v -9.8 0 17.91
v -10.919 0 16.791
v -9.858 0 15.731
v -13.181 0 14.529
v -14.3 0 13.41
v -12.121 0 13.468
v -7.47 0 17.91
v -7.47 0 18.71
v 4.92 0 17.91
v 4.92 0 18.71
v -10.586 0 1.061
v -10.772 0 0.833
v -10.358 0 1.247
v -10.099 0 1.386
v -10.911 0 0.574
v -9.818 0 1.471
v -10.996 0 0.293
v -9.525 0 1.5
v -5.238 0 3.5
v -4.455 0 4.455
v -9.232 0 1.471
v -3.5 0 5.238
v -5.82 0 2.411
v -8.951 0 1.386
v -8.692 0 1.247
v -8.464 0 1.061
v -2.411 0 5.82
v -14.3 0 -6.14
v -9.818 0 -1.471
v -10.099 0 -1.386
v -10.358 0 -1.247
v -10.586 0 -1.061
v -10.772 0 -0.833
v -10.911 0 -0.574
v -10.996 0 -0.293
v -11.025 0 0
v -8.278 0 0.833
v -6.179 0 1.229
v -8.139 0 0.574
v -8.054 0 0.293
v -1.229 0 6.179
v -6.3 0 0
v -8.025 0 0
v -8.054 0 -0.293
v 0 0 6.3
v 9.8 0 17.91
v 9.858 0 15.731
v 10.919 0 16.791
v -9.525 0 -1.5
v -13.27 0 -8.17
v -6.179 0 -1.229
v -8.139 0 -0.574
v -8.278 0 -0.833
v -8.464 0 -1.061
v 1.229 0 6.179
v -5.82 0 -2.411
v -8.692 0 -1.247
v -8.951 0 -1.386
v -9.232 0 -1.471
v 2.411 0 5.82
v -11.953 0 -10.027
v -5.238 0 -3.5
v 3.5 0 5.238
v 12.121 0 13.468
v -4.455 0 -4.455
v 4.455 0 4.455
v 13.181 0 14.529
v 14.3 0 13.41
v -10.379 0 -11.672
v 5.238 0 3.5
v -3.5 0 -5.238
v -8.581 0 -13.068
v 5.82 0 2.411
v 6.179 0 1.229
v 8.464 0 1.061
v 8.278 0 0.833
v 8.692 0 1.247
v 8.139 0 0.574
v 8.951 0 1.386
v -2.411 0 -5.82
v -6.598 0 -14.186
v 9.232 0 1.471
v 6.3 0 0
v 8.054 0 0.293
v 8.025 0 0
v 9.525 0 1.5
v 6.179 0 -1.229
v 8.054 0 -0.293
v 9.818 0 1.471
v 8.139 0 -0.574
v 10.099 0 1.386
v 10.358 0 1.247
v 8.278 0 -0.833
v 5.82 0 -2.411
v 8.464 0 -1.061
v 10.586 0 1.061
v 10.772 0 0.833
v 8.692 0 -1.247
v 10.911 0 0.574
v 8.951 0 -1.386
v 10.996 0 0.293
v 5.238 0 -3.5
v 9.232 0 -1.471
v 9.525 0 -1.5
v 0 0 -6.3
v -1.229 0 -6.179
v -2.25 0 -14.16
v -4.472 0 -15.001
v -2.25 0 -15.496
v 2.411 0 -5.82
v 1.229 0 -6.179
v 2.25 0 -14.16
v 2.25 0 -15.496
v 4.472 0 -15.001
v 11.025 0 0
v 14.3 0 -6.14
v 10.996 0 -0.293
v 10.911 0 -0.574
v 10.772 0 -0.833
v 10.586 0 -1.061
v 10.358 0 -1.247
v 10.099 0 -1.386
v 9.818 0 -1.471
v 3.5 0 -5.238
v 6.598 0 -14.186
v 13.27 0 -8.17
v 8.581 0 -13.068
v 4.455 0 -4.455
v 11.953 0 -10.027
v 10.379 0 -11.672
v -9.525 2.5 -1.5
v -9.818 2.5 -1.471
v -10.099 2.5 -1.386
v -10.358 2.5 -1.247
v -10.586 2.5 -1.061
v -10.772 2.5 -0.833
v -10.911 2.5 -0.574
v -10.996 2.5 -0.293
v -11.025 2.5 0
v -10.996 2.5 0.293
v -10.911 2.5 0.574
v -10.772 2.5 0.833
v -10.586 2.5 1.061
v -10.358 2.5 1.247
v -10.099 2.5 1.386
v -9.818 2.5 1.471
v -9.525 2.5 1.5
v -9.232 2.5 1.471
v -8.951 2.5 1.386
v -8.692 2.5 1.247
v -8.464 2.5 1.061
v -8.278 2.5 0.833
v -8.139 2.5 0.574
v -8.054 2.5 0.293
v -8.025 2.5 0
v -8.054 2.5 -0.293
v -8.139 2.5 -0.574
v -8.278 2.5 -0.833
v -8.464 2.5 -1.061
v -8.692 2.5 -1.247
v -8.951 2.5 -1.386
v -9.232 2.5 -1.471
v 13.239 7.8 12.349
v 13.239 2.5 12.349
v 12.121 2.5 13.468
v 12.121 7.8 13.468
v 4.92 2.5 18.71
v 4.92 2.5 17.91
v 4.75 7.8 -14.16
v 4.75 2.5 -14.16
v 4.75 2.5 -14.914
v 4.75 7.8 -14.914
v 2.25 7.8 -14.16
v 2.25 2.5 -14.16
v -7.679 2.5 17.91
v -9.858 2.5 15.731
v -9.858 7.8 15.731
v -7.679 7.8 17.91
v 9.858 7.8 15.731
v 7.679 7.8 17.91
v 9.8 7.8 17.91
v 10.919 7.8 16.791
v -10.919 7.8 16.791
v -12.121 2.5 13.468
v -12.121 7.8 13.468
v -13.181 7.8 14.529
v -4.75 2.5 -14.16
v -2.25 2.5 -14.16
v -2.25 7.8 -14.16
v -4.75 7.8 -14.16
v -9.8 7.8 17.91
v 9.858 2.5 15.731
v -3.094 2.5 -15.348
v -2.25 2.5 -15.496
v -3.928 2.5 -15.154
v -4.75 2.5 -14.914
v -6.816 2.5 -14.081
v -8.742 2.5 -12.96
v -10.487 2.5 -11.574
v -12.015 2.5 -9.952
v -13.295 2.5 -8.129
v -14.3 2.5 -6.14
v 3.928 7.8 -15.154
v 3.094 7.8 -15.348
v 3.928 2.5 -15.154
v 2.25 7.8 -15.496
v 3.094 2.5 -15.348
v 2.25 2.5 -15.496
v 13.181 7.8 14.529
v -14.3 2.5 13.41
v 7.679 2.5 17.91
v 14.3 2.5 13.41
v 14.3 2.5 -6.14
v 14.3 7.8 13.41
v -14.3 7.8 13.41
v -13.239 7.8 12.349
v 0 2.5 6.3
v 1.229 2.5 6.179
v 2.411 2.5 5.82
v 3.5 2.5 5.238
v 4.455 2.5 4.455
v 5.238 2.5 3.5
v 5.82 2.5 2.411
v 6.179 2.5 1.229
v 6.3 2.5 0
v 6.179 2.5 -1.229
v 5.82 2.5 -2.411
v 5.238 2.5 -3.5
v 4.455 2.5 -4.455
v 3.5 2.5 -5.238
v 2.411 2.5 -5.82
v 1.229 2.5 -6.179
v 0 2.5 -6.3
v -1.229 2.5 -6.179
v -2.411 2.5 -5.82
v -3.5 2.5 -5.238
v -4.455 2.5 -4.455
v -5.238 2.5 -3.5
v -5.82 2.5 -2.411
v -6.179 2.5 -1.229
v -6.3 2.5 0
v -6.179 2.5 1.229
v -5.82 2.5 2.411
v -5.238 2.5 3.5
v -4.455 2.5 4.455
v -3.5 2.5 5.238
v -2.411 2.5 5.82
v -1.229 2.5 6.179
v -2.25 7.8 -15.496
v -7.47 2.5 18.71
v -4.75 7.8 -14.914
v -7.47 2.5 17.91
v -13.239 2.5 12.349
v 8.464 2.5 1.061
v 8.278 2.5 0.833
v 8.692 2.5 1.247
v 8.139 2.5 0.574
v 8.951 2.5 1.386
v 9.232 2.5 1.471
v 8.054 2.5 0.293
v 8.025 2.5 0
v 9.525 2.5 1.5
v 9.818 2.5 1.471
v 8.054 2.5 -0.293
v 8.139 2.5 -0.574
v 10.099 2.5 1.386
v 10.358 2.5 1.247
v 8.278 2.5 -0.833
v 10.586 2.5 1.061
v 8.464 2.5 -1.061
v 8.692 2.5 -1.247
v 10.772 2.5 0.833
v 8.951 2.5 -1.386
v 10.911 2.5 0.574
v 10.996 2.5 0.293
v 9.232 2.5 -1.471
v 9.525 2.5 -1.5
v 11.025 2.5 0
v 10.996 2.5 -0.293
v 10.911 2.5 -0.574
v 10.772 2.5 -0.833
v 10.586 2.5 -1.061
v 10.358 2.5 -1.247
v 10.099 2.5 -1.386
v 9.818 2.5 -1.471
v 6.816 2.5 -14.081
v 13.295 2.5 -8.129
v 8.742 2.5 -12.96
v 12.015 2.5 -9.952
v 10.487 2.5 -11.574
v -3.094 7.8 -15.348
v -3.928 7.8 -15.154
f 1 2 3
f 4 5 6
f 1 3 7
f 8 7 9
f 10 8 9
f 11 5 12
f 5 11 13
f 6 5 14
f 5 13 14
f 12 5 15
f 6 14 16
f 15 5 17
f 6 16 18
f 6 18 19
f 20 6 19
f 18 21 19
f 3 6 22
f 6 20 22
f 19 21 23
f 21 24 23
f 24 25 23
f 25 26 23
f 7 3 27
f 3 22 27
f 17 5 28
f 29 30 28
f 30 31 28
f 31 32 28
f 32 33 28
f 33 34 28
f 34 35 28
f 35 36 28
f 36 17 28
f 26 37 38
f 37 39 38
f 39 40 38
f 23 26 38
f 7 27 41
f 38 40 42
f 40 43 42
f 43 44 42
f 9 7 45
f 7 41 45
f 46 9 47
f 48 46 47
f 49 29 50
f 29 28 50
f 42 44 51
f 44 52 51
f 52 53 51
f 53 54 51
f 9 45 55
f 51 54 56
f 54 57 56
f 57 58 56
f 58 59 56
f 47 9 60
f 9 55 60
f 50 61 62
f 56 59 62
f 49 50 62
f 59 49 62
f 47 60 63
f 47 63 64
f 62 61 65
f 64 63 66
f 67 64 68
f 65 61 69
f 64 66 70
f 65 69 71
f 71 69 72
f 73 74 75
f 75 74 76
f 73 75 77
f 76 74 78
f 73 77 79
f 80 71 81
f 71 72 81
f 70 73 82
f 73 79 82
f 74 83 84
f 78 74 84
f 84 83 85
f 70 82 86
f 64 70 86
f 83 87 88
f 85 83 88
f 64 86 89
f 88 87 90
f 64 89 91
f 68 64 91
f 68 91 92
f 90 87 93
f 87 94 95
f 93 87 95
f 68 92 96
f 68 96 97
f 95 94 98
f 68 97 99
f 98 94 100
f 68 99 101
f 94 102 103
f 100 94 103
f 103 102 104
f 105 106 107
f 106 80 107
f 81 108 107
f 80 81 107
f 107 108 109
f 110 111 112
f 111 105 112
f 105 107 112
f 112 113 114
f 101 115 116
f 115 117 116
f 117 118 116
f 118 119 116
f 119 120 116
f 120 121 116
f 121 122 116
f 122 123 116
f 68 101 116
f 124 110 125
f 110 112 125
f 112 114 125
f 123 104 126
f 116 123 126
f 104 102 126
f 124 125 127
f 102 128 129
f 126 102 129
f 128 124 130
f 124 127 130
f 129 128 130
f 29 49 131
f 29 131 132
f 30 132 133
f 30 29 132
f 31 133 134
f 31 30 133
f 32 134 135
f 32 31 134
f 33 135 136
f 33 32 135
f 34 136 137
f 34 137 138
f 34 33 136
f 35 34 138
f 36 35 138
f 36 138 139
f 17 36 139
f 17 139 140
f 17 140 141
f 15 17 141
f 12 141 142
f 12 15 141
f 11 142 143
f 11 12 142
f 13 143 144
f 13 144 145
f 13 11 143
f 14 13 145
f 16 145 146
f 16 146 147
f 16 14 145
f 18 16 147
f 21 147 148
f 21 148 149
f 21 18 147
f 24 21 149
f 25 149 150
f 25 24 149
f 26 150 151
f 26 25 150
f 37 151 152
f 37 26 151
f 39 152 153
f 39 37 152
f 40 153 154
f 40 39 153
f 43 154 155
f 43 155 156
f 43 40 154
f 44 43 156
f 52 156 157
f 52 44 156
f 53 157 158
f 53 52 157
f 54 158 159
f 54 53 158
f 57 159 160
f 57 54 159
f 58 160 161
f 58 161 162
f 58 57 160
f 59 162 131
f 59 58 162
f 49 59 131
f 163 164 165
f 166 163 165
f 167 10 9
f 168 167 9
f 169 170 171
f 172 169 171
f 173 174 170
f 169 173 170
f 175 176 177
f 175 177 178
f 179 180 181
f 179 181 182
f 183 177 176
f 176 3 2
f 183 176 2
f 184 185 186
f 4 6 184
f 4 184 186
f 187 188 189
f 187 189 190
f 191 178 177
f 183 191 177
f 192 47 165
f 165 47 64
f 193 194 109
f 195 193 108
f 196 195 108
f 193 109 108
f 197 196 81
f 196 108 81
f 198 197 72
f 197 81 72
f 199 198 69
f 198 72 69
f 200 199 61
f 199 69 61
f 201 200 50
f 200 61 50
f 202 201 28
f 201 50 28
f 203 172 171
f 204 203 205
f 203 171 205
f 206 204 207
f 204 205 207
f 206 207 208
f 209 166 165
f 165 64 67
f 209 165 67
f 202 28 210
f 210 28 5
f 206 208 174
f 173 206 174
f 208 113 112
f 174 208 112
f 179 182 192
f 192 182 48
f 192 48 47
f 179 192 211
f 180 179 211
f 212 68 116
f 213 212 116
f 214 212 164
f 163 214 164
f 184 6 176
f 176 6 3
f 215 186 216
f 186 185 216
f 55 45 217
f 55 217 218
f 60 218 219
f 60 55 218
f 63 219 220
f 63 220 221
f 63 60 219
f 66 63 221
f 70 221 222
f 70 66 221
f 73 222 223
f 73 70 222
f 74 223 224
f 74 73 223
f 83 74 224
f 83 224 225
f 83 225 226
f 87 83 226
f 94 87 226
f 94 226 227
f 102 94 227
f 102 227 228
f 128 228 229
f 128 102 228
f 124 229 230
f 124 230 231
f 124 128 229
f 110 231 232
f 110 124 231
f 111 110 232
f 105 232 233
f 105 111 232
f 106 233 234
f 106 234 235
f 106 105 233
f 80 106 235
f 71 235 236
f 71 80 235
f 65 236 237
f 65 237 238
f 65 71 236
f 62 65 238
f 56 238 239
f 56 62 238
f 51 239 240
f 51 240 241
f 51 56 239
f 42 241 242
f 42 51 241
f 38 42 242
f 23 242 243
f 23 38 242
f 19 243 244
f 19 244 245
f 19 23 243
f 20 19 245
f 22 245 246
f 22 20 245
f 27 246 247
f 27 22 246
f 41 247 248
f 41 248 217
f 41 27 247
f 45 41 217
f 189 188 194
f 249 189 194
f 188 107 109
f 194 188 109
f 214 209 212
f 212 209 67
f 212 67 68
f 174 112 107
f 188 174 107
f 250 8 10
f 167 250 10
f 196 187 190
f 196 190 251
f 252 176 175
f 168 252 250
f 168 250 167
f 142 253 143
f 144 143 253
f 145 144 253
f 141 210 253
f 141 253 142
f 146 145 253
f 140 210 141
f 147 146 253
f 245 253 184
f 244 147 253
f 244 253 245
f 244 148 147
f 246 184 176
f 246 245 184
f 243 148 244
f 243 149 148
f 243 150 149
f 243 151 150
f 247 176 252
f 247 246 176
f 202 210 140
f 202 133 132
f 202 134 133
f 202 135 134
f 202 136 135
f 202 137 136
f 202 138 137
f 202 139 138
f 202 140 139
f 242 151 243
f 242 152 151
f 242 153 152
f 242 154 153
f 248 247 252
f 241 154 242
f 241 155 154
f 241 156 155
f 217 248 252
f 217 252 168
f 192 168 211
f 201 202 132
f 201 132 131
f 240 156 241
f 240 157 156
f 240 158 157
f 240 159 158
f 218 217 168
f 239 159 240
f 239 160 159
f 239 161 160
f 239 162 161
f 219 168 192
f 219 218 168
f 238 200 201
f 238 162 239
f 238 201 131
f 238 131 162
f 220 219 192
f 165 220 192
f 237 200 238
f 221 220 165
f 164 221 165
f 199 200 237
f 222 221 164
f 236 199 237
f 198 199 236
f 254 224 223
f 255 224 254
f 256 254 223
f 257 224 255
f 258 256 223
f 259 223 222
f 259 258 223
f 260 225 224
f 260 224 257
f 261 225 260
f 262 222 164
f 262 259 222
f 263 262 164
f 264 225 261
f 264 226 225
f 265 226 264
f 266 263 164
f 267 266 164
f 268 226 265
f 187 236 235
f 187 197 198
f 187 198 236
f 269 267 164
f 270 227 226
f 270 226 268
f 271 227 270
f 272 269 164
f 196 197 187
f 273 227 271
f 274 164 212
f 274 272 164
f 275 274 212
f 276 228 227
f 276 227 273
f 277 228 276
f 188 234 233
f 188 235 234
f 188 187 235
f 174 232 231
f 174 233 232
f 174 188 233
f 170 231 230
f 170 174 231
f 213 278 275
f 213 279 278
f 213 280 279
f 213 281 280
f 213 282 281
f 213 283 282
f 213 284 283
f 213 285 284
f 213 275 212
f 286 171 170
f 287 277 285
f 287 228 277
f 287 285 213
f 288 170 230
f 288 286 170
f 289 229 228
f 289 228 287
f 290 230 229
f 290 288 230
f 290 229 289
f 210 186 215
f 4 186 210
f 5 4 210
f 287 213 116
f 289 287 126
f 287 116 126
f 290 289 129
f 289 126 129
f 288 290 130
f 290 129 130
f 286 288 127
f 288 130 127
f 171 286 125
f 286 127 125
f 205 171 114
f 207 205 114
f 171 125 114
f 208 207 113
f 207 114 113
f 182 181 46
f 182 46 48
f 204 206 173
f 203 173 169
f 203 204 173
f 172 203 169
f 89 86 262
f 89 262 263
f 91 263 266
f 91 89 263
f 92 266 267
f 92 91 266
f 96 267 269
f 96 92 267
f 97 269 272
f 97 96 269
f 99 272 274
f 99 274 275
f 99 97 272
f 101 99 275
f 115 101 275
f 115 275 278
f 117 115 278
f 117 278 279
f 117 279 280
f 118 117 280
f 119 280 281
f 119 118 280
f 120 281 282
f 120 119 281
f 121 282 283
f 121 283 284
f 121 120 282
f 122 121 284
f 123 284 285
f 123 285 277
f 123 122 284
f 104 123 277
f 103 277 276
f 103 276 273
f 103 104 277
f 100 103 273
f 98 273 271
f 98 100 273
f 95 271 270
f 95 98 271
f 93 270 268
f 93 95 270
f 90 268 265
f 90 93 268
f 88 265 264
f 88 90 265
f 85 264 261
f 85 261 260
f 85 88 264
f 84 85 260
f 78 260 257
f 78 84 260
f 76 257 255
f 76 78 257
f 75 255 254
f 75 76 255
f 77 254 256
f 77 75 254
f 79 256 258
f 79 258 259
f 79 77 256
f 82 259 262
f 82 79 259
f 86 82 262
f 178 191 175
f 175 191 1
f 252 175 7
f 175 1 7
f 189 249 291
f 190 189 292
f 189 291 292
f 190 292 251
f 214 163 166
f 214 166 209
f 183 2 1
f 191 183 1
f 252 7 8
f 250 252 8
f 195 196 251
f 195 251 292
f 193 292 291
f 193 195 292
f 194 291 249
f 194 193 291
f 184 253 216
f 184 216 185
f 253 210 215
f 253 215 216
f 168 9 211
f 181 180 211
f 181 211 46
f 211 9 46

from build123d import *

# Parameters (mm, degrees)
SKETCH1_R               = 1.5
SKETCH1_R_2             = 6.3
BOSS_EXTRUDE1_DEPTH     = 2.5
CUT_EXTRUDE1_DEPTH      = 24.681302751
CUT_EXTRUDE1_DEPTH_BACK = 24.681302751
BOSS_EXTRUDE2_DEPTH     = 5.3


with BuildPart() as part:
    # Sketch1 → Boss-Extrude1 (new body)
    with BuildSketch(Plane(origin=(0, 0, 0), x_dir=(1, 0, 0), z_dir=(0, 1, 0))):
        with BuildLine():
            Line((-14.3, 6.139966555), (-14.3, -13.41))
            Line((-14.3, -13.41), (-9.8, -17.91))
            Line((-9.8, -17.91), (-7.47, -17.91))
            Line((-7.47, -17.91), (-7.47, -18.71))
            Line((-7.47, -18.71), (4.92, -18.71))
            Line((4.92, -18.71), (4.92, -17.91))
            Line((4.92, -17.91), (9.8, -17.91))
            Line((9.8, -17.91), (14.3, -13.41))
            Line((14.3, -13.41), (14.3, 6.139966555))
            ThreePointArc((14.3, 6.139966555), (9.505716305, 12.4030126), (2.25, 15.495824073))
            Line((2.25, 15.495824073), (2.25, 14.16))
            Line((2.25, 14.16), (-2.25, 14.16))
            Line((-2.25, 14.16), (-2.25, 15.495824073))
            ThreePointArc((-2.25, 15.495824073), (-9.505716305, 12.4030126), (-14.3, 6.139966555))
        make_face()
        with Locations(Location((9.525, 0, 0), (0, 0, 270))):
            Circle(SKETCH1_R, mode=Mode.SUBTRACT)
        with Locations(Location((-9.525, 0, 0), (0, 0, 90))):
            Circle(SKETCH1_R, mode=Mode.SUBTRACT)
        with Locations(Location((0, 0, 0), (0, 0, 270))):
            Circle(SKETCH1_R_2, mode=Mode.SUBTRACT)
    extrude(amount=BOSS_EXTRUDE1_DEPTH)

    # Sketch2 → Cut-Extrude1 (cut, two sides: drawn at the far end of the back side and taken through both)
    with BuildSketch(Plane(origin=(0, 2.5, 0), x_dir=(1, 0, 0), z_dir=(0, 1, 0)).offset(-CUT_EXTRUDE1_DEPTH_BACK)):
        Polygon((-12.120710678, -13.467968978), (-9.857968978, -15.730710678), (-10.91862915, -16.79137085), (-13.18137085, -14.52862915), align=None)
        Polygon((12.120710678, -13.467968978), (13.18137085, -14.52862915), (10.91862915, -16.79137085), (9.857968978, -15.730710678), align=None)
    extrude(amount=CUT_EXTRUDE1_DEPTH + CUT_EXTRUDE1_DEPTH_BACK, mode=Mode.SUBTRACT)

    # Sketch3 → Boss-Extrude2 (add)
    with BuildSketch(Plane(origin=(0, 2.5, 0), x_dir=(1, 0, 0), z_dir=(0, 1, 0))):
        Polygon((-13.18137085, -14.52862915), (-14.3, -13.41), (-13.239339828, -12.349339828), (-12.120710678, -13.467968978), align=None)
        Polygon((-10.91862915, -16.79137085), (-9.857968978, -15.730710678), (-7.678679656, -17.91), (-9.8, -17.91), align=None)
        Polygon((13.239339828, -12.349339828), (12.120710678, -13.467968978), (13.18137085, -14.52862915), (14.3, -13.41), align=None)
        Polygon((7.678679656, -17.91), (9.8, -17.91), (10.91862915, -16.79137085), (9.857968978, -15.730710678), align=None)
        with BuildLine():
            Line((2.25, 15.495824073), (2.25, 14.16))
            Line((2.25, 14.16), (4.75, 14.16))
            Line((4.75, 14.16), (4.75, 14.91423668))
            ThreePointArc((4.75, 14.91423668), (3.512059364, 15.256868517), (2.25, 15.495824073))
        make_face()
        with BuildLine():
            Line((-2.25, 15.495824073), (-2.25, 14.16))
            Line((-2.25, 14.16), (-4.75, 14.16))
            Line((-4.75, 14.16), (-4.75, 14.91423668))
            ThreePointArc((-4.75, 14.91423668), (-3.512059364, 15.256868517), (-2.25, 15.495824073))
        make_face()
    extrude(amount=BOSS_EXTRUDE2_DEPTH)


solid = part.part
